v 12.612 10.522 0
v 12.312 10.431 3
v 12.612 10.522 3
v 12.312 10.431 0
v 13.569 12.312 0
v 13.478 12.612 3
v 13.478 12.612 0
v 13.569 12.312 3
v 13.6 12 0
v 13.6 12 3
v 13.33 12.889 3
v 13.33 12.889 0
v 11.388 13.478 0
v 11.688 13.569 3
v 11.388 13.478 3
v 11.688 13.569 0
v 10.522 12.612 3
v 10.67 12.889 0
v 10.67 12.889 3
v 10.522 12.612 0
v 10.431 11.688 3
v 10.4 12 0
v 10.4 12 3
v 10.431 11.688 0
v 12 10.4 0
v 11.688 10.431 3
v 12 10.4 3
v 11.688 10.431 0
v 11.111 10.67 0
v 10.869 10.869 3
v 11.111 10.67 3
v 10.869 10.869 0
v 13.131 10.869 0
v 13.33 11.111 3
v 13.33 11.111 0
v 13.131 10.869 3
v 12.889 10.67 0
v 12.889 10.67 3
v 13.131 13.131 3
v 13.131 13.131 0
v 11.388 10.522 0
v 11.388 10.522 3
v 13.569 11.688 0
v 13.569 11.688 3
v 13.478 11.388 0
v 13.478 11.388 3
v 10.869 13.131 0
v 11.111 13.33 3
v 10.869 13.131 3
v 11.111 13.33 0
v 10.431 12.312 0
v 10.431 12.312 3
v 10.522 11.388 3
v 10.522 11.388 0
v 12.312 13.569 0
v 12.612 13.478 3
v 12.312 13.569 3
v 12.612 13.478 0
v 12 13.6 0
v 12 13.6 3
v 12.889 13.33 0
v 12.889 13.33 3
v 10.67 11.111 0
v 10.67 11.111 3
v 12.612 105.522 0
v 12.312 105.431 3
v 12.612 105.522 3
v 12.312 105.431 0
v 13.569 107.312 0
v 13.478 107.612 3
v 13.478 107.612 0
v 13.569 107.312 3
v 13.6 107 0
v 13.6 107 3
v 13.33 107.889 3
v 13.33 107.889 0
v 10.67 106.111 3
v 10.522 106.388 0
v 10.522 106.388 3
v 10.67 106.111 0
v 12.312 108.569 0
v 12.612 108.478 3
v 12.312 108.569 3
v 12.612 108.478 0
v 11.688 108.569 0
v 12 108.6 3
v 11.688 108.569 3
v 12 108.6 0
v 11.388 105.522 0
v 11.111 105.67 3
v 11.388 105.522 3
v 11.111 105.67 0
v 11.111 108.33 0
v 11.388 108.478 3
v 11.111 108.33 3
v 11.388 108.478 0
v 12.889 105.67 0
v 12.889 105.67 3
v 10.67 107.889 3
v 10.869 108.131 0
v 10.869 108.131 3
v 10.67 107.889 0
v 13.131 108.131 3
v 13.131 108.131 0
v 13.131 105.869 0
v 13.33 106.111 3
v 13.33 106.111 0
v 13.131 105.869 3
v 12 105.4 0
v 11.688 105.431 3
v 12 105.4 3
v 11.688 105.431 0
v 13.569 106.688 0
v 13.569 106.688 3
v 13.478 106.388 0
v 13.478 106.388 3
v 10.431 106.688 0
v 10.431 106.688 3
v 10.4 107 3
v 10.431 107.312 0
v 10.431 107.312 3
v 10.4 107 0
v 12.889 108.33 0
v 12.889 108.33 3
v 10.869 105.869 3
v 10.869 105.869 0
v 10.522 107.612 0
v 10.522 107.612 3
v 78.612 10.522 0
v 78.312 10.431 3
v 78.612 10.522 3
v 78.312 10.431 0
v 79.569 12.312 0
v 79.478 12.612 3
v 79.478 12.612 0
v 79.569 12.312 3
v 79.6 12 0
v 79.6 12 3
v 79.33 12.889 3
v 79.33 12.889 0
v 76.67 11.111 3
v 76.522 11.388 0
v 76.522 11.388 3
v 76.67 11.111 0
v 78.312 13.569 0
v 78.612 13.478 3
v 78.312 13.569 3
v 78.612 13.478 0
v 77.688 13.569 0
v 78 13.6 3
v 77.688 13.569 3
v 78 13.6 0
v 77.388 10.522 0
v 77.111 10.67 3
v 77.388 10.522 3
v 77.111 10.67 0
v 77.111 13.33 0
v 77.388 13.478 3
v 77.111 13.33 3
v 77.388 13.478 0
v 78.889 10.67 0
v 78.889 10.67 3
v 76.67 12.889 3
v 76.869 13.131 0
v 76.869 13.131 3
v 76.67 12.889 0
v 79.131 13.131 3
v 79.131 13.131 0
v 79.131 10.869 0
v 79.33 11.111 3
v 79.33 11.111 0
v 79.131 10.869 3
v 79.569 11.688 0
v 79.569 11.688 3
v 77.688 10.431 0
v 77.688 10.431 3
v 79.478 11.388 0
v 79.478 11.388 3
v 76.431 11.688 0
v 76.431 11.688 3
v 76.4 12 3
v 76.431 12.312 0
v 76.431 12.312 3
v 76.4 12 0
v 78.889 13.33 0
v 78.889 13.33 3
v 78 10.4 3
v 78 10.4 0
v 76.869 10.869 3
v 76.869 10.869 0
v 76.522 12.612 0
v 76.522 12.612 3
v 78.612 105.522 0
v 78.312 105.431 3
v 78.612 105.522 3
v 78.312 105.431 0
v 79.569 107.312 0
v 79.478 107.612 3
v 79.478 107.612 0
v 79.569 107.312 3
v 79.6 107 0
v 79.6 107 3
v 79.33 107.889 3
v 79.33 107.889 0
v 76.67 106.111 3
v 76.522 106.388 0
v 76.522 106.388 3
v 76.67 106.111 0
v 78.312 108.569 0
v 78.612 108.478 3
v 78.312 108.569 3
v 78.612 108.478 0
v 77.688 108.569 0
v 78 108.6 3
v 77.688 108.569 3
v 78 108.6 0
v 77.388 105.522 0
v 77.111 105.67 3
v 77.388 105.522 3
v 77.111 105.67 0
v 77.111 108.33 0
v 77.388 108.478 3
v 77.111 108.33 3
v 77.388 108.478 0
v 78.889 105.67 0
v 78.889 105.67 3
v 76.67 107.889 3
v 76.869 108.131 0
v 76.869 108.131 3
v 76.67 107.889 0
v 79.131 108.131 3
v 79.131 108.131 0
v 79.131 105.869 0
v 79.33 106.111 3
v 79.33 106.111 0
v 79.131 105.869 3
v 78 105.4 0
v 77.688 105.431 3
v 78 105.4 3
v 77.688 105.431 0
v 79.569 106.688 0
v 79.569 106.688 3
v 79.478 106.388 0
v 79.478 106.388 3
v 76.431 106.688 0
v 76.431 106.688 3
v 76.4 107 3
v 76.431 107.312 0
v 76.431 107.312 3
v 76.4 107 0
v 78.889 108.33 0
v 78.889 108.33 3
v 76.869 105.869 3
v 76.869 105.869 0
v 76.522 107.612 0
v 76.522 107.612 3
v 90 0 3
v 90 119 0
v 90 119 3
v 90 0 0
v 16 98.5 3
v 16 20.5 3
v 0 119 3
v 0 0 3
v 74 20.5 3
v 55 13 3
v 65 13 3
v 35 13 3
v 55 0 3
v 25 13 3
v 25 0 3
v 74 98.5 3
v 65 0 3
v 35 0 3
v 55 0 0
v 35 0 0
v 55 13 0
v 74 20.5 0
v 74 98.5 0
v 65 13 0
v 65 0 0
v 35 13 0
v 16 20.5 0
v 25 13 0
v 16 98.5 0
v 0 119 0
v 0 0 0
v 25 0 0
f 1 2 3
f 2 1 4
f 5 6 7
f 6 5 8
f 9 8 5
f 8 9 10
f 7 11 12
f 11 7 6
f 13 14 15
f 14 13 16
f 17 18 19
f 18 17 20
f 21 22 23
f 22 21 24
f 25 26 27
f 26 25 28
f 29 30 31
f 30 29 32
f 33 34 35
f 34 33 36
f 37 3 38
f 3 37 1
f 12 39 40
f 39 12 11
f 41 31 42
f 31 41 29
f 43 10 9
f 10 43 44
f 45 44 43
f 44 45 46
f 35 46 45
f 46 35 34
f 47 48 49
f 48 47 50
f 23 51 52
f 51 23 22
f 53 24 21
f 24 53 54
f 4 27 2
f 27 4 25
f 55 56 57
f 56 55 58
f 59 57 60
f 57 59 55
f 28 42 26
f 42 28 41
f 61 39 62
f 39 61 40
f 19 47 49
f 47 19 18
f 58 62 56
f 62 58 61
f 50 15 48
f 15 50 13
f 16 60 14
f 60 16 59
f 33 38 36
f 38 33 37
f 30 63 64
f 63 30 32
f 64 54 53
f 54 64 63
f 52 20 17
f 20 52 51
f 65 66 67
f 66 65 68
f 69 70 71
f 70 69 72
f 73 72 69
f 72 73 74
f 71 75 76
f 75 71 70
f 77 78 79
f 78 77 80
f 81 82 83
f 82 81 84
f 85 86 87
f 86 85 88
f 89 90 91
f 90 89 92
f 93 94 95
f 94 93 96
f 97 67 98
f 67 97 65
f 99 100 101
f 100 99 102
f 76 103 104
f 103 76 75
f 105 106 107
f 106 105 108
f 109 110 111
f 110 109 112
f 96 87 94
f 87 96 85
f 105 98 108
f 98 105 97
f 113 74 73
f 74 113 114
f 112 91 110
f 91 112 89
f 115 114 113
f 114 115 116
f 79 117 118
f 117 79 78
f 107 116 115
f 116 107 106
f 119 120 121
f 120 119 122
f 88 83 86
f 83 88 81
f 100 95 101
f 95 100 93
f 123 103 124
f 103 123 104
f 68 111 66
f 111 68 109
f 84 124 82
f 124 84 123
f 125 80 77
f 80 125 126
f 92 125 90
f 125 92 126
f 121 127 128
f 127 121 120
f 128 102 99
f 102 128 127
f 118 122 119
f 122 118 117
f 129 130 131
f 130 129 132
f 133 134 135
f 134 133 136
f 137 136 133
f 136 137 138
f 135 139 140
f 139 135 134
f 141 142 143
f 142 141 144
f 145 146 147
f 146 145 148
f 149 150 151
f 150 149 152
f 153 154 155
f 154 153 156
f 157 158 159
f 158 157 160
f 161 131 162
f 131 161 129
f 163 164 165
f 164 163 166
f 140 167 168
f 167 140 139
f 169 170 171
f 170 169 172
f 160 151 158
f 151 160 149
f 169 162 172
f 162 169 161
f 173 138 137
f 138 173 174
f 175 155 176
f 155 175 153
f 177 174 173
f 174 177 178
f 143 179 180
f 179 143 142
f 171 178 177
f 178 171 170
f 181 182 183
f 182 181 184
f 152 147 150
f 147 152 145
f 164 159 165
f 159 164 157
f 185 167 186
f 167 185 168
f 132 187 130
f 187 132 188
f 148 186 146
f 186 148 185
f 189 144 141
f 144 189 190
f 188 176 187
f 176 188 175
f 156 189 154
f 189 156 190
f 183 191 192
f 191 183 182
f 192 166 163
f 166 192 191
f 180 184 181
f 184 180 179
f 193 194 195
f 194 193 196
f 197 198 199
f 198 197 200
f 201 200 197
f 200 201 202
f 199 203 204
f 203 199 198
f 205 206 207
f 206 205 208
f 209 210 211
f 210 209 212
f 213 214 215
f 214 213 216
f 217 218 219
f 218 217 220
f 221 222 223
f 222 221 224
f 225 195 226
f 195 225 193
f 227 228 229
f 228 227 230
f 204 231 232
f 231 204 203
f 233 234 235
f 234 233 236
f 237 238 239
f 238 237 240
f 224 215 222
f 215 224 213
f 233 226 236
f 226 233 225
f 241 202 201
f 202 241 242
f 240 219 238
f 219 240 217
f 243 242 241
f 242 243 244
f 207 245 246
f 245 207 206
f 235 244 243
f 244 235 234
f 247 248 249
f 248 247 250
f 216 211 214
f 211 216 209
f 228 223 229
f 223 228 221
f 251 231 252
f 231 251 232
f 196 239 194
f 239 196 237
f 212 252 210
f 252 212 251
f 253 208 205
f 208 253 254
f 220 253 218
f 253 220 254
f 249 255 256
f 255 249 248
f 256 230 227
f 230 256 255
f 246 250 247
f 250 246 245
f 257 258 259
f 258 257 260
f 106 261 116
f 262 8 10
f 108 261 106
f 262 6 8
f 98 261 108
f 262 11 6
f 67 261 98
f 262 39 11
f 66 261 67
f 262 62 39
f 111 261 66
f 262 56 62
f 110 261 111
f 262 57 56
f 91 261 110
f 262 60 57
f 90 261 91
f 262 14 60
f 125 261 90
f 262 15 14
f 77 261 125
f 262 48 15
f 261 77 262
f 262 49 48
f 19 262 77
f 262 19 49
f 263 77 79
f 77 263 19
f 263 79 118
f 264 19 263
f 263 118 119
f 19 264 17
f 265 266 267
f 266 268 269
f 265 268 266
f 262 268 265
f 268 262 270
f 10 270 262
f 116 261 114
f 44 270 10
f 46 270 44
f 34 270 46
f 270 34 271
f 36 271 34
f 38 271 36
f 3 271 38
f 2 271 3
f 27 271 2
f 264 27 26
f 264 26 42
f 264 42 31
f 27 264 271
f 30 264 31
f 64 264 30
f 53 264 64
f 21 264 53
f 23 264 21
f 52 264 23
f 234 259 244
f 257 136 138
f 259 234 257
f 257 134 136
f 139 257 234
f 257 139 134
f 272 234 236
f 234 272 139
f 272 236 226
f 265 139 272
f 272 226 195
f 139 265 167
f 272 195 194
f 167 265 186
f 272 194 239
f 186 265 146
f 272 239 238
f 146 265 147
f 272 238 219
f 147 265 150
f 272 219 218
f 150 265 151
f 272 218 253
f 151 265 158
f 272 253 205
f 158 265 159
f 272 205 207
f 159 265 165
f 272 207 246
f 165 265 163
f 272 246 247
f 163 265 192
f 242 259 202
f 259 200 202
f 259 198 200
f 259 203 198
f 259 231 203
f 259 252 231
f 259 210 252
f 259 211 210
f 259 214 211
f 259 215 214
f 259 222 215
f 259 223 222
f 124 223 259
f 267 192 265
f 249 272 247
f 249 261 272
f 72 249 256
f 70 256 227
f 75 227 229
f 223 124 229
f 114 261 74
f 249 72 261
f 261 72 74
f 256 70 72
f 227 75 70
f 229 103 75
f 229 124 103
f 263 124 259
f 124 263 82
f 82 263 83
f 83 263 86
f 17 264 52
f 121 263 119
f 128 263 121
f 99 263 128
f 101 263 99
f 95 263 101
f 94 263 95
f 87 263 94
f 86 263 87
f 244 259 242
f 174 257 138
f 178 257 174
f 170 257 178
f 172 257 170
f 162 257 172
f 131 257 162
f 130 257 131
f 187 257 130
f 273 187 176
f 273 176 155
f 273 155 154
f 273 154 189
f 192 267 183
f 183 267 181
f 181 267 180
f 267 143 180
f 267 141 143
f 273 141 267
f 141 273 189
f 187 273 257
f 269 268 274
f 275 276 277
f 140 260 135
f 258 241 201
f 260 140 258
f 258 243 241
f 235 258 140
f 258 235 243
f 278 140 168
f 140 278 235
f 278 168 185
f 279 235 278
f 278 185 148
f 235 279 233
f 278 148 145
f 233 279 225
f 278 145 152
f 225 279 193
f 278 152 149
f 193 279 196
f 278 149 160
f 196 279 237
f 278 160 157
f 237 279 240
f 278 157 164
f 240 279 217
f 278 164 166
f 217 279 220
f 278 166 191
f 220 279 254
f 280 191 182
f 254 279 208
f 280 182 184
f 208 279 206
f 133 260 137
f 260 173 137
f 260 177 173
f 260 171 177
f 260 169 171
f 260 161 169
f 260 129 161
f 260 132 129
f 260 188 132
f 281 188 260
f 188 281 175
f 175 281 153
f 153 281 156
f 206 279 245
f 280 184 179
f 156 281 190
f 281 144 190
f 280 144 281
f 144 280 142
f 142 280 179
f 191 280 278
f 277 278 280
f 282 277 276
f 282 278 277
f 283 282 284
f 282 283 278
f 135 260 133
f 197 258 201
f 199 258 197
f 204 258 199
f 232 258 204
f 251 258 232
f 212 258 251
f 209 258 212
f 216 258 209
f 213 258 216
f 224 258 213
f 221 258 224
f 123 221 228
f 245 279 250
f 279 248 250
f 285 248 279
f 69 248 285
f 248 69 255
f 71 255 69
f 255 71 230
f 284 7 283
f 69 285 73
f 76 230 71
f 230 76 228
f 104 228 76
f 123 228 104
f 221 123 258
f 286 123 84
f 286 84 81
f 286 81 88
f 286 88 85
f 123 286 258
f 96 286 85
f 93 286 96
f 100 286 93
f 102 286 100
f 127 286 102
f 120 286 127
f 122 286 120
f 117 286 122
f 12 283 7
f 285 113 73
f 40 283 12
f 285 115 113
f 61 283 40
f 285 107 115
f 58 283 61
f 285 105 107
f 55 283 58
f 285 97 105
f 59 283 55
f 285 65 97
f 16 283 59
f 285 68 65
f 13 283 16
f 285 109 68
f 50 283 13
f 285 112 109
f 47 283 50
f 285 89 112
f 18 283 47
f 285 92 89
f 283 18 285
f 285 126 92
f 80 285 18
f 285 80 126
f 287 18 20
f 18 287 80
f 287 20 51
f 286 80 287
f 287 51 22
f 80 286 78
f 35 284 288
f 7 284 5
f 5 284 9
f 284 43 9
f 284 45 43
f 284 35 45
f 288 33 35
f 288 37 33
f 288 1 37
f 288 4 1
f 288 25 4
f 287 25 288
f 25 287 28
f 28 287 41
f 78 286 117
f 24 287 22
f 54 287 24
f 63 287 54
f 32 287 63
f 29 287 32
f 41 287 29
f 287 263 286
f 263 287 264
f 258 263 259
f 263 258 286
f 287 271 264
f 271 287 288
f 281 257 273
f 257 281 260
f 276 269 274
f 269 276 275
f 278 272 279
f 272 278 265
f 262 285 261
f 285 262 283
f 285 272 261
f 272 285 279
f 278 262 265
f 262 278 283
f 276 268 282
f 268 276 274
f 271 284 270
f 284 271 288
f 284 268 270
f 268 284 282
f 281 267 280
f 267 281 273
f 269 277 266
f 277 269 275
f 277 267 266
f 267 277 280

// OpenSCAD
// Cheap fit coupon for Rugged A1.
// STATUS: must be parameterized from caliper measurements before export.
// This is intentionally not the final enclosure.

// MEASURE_REQUIRED: enter real values from the TPM408 and ESP32 carrier.
tft_hole_spacing_x = 66.0;
tft_hole_spacing_y = 95.0;
tft_hole_d = 3.2;
tft_window_w = 58.0;
tft_window_h = 78.0;
usb_center_spacing = 30.0; // MEASURE_REQUIRED between the two USB-C centers
usb_w = 10.0;
usb_h = 5.0;
plate_t = 3.0;
edge = 12.0;

plate_w = tft_hole_spacing_x + 2*edge;
plate_h = tft_hole_spacing_y + 2*edge;

difference() {
    cube([plate_w, plate_h, plate_t]);
    // TFT mounting-hole test pattern.
    for (x=[edge, edge+tft_hole_spacing_x])
        for (y=[edge, edge+tft_hole_spacing_y])
            translate([x,y,-1]) cylinder(d=tft_hole_d,h=plate_t+2,$fn=32);
    // Active-window test aperture.
    translate([(plate_w-tft_window_w)/2,(plate_h-tft_window_h)/2,-1])
        cube([tft_window_w,tft_window_h,plate_t+2]);
    // Two USB-C gauge slots; position/orientation must be adjusted to the real carrier.
    translate([(plate_w-usb_center_spacing)/2-usb_w/2, -1, 0]) cube([usb_w,edge+2,usb_h]);
    translate([(plate_w+usb_center_spacing)/2-usb_w/2, -1, 0]) cube([usb_w,edge+2,usb_h]);
}
